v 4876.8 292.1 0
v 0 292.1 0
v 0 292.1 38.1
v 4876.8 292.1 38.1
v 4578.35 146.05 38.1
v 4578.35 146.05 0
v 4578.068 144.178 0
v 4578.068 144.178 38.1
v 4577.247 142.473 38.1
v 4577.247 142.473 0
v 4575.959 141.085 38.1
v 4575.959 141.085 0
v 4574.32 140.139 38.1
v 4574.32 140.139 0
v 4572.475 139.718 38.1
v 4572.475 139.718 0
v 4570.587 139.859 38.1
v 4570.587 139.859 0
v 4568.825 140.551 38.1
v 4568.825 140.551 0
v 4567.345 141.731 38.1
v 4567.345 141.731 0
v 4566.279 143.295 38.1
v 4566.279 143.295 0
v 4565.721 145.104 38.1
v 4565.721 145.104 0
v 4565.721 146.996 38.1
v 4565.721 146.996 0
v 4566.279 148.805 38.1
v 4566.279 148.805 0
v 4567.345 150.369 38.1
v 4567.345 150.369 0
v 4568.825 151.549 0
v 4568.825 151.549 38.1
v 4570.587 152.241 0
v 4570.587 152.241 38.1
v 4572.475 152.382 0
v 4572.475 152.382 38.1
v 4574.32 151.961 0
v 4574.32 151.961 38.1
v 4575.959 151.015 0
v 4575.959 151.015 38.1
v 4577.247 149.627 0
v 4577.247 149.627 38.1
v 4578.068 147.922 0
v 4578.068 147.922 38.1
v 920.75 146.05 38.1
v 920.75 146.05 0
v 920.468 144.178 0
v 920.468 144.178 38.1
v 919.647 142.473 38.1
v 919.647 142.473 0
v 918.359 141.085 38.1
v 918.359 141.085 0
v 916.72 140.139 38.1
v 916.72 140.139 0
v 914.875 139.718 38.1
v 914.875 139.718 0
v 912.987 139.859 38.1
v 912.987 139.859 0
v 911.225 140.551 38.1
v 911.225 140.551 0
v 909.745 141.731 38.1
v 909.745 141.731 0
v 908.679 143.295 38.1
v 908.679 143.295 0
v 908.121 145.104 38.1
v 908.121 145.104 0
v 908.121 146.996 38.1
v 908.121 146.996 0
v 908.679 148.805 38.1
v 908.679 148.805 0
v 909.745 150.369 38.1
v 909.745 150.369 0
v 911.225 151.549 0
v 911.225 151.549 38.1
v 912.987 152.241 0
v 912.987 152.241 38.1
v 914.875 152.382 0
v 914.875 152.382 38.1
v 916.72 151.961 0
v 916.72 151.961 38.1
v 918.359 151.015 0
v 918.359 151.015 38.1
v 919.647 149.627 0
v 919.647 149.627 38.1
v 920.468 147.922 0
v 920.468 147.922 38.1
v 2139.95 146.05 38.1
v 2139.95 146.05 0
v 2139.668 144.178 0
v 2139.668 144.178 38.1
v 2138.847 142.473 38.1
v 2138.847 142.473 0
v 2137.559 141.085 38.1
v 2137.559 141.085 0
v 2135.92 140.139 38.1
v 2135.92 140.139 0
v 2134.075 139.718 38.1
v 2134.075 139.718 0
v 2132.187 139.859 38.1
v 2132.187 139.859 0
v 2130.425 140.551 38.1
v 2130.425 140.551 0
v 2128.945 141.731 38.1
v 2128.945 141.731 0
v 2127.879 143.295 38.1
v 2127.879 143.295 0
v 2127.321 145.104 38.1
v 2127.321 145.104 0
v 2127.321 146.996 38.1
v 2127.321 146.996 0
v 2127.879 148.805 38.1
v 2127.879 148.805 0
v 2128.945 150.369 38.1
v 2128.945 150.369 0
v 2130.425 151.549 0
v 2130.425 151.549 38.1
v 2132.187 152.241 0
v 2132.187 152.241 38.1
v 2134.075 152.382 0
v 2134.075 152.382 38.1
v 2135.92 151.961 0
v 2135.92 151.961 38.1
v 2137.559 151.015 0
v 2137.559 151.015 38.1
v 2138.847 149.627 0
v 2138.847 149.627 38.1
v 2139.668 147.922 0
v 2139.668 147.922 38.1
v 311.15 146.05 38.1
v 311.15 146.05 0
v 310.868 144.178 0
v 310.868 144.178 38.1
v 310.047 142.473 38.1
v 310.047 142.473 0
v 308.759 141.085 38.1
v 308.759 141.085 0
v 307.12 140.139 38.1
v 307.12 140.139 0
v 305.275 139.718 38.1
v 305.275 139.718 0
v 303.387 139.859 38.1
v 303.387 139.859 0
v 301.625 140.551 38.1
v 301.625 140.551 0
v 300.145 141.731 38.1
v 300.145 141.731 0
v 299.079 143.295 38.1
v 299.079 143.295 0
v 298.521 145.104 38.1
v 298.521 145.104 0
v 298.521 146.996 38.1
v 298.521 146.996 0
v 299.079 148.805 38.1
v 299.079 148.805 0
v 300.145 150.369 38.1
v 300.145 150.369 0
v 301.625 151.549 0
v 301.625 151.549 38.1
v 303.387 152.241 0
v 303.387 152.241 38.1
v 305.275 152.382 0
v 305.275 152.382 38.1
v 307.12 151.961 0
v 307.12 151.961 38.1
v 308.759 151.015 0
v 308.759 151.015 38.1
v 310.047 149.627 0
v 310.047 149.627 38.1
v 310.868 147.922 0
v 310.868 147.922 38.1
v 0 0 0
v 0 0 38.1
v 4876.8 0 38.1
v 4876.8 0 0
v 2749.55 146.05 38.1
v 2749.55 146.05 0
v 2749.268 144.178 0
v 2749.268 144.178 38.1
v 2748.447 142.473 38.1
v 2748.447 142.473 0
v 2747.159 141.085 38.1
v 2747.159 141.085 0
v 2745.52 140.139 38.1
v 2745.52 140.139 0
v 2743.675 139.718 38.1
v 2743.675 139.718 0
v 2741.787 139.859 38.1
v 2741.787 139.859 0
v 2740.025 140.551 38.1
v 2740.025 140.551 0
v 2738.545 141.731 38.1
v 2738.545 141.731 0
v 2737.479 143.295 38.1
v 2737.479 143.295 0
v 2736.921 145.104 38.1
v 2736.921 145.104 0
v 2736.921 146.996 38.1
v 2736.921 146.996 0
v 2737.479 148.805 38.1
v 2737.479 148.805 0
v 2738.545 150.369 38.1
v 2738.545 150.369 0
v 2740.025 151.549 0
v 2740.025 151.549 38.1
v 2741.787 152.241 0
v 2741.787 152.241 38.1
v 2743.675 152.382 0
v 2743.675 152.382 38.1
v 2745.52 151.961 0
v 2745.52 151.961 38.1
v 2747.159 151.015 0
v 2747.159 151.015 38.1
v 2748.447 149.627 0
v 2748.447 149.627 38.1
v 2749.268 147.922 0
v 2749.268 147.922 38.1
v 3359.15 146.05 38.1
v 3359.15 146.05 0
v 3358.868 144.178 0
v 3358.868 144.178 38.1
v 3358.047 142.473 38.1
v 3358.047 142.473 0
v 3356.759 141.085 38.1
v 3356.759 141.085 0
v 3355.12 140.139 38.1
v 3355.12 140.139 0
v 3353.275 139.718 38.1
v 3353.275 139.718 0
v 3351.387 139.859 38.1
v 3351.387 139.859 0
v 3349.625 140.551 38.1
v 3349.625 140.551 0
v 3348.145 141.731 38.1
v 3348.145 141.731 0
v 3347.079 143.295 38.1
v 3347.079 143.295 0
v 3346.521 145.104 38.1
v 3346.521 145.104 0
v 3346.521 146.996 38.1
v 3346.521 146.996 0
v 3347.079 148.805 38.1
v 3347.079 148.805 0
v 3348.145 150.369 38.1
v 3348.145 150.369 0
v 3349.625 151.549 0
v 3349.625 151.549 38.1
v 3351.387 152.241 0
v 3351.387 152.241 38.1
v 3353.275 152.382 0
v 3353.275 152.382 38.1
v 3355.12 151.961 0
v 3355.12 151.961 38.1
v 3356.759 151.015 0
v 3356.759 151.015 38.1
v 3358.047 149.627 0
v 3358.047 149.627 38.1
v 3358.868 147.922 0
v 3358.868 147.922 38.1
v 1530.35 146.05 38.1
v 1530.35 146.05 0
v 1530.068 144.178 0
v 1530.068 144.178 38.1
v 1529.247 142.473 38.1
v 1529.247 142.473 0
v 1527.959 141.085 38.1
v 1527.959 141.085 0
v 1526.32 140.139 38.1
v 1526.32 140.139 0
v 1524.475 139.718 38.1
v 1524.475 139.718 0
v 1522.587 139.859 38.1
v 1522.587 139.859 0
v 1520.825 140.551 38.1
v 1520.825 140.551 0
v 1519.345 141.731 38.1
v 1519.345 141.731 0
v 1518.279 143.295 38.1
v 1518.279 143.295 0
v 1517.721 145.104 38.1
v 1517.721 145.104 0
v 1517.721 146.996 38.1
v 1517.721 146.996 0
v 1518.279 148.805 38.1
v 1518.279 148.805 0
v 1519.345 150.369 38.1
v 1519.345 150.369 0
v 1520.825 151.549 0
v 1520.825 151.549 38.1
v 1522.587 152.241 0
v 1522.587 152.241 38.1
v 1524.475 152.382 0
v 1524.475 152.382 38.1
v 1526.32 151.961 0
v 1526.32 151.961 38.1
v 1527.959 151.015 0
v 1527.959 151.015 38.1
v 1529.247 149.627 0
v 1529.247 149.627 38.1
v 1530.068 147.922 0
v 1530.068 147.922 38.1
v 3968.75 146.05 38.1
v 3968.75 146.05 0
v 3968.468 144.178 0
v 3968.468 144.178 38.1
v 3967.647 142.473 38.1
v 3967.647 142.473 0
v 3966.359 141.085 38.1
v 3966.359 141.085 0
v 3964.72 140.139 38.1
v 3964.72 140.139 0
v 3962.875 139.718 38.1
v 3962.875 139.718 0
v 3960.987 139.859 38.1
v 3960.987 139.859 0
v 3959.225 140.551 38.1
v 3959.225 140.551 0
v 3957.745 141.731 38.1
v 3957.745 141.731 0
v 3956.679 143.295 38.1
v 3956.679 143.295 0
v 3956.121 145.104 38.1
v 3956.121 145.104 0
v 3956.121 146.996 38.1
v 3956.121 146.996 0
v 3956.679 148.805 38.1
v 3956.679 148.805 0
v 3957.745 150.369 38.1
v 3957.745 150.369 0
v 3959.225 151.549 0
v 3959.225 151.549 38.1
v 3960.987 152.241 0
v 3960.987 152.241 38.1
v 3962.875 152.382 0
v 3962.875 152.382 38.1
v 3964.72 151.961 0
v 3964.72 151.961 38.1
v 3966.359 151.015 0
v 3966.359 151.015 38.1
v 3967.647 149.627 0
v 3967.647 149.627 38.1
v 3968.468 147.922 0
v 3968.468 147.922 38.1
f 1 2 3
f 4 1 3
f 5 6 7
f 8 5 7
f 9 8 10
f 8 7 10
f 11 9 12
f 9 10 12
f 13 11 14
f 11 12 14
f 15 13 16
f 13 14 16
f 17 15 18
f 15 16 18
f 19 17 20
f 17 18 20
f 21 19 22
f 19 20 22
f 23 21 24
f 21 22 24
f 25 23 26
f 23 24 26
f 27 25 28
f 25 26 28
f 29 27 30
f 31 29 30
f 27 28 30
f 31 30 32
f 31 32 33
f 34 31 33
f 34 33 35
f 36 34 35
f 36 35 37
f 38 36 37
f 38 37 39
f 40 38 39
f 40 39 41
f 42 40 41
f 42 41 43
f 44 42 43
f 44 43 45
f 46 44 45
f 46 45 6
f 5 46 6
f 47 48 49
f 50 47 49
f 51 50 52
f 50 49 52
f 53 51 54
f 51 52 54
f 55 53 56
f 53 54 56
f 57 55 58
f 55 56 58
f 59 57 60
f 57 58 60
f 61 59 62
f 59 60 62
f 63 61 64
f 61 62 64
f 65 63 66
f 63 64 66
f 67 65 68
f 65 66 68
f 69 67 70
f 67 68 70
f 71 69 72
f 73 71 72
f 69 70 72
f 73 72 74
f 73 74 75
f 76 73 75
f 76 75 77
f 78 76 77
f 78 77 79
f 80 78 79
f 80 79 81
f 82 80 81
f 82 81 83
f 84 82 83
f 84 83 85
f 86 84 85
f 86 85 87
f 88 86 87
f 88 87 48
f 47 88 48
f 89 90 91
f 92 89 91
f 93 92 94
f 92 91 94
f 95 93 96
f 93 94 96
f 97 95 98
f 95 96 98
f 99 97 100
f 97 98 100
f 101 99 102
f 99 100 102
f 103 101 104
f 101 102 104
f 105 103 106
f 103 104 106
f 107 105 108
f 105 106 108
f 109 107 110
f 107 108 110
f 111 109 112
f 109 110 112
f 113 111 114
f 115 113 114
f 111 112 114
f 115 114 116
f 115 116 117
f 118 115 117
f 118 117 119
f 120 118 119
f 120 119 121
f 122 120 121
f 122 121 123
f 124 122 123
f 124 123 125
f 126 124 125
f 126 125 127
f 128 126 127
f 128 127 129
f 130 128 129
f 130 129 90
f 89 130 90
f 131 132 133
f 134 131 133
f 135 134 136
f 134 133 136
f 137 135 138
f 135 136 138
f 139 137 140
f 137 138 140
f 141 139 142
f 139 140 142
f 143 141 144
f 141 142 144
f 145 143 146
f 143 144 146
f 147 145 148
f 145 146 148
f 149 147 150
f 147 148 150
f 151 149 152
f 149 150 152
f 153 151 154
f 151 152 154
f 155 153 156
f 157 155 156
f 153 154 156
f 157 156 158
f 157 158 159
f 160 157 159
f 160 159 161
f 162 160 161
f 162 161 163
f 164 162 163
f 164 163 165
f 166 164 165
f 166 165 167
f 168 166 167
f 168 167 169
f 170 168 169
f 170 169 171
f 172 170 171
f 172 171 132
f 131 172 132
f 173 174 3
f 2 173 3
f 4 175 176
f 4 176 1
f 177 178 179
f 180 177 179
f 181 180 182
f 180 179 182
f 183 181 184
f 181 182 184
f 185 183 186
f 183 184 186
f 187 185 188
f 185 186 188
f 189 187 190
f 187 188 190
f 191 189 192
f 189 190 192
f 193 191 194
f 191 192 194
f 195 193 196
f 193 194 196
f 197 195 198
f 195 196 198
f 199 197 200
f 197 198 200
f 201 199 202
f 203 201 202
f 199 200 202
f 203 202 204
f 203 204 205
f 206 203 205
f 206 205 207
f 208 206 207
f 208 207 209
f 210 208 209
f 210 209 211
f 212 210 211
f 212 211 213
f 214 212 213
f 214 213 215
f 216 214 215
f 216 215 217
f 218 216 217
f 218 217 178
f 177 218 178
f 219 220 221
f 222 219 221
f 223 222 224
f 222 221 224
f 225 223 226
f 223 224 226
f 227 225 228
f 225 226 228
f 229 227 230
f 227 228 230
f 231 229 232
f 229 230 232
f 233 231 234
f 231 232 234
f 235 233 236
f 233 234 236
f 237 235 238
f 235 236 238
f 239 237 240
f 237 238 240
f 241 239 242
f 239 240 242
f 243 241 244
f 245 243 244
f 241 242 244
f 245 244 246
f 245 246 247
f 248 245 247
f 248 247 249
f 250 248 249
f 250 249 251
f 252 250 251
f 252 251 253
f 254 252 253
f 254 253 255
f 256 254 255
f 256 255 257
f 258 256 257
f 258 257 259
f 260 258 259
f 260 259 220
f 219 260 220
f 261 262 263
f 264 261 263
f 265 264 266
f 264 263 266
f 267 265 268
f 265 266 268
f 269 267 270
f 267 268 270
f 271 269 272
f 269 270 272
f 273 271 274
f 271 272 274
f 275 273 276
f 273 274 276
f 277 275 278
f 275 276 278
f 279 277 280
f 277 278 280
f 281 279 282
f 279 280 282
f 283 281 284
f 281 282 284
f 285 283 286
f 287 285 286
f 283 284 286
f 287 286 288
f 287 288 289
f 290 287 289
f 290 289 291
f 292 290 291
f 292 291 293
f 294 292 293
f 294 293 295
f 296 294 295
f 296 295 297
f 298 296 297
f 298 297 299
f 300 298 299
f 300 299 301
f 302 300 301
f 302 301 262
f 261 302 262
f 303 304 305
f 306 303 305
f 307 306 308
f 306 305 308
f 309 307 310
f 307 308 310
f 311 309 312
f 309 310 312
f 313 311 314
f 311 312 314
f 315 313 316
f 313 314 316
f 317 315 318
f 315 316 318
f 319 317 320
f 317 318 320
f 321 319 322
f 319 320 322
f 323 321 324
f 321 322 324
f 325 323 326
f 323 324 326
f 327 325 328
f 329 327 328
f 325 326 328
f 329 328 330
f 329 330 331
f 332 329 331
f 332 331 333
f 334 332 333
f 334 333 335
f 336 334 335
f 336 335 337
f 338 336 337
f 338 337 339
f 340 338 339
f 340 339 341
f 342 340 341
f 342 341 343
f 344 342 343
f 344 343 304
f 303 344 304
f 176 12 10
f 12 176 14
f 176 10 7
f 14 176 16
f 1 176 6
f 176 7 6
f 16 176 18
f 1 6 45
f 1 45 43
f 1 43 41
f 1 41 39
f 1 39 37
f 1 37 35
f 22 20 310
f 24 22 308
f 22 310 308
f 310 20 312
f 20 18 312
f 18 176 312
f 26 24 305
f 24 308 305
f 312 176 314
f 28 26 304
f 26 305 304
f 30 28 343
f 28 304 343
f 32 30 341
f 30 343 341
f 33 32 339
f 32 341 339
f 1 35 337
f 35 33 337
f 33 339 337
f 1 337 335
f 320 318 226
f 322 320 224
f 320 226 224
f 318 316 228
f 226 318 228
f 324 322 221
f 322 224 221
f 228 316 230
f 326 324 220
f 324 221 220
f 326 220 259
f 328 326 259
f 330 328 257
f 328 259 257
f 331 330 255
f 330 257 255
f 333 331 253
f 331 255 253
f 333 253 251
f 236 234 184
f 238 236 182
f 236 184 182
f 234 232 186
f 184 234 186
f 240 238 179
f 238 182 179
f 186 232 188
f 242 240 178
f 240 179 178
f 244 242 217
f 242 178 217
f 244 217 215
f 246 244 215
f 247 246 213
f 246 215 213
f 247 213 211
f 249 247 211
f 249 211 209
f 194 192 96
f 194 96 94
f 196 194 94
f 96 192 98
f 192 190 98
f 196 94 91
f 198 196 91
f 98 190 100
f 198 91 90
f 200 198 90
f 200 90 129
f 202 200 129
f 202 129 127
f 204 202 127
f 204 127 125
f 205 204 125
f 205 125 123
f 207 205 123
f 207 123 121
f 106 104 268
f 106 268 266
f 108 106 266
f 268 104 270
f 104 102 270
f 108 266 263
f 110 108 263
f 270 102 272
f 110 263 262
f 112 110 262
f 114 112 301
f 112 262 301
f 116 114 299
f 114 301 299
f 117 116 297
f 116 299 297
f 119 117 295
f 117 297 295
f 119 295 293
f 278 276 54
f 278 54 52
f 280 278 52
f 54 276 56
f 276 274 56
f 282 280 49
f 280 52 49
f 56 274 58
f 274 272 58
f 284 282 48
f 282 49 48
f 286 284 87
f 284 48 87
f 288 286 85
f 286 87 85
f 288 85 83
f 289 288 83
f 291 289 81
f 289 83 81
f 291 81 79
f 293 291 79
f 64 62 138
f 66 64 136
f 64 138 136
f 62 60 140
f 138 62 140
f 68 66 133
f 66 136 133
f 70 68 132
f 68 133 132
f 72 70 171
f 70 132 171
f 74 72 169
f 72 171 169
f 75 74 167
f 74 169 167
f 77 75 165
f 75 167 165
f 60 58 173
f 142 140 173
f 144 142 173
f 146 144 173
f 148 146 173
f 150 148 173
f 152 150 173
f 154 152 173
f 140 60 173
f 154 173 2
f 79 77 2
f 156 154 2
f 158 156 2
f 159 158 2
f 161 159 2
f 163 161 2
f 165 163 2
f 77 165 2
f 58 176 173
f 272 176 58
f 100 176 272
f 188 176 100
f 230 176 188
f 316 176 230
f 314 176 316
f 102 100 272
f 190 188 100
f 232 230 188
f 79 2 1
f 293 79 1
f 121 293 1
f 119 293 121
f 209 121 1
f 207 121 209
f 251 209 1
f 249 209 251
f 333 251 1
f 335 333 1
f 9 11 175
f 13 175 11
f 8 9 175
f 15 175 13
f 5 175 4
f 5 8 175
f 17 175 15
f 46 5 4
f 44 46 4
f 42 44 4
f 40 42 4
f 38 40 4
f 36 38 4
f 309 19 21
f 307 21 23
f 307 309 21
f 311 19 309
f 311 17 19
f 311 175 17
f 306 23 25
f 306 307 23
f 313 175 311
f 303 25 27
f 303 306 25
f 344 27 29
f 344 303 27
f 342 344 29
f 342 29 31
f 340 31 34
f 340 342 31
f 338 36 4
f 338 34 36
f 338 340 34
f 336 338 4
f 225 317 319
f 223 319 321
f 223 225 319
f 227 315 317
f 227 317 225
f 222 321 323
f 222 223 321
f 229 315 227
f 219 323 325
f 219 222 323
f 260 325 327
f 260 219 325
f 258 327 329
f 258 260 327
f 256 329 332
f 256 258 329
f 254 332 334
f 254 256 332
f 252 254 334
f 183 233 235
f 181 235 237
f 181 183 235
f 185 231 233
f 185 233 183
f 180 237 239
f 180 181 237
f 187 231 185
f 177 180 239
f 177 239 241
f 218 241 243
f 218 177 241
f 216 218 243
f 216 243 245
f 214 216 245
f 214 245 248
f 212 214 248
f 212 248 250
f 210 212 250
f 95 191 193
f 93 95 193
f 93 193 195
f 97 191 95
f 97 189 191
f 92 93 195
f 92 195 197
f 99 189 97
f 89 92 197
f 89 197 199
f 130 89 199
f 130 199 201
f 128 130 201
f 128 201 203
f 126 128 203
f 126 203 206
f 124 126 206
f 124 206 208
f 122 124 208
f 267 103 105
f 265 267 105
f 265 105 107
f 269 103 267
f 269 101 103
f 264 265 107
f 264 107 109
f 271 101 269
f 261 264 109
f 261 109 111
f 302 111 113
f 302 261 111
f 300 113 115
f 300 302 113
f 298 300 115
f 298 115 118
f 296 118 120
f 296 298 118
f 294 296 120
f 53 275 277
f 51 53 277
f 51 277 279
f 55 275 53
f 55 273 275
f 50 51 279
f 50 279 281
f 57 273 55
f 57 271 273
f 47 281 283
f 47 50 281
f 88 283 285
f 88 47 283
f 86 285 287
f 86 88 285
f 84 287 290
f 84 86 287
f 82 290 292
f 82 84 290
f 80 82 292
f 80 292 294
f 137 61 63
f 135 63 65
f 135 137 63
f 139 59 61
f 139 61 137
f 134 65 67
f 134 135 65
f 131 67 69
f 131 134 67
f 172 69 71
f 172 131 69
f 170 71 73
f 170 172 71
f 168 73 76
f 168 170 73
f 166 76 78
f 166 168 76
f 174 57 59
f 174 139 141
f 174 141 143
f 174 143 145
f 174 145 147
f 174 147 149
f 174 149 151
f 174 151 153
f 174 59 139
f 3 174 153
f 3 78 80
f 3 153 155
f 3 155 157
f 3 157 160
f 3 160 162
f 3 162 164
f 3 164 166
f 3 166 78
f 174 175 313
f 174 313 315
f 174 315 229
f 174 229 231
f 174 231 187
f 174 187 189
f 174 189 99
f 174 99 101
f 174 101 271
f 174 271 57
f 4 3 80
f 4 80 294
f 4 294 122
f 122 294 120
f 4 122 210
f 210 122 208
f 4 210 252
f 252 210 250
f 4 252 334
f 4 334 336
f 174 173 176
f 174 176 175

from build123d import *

# Parameters (mm, degrees)
F0_W     = 292.1
F0_H     = 38.1
F1_DEPTH = 4876.8
F2_R     = 6.35
F3_DEPTH = 38.101


with BuildPart() as f1:
    # F0 (on Right) → F1 (new body)
    with BuildSketch(Plane.YZ):
        with Locations((146.05, 19.05)):
            Rectangle(F0_W, F0_H)
    extrude(amount=F1_DEPTH)

    # F2 (on face) → F3 (cut, through all)
    with BuildSketch(Plane(origin=(0, 0, 0), x_dir=(1, 0, 0), z_dir=(0, 0, -1))):
        with Locations((304.8, -146.05)):
            Circle(F2_R)
        with Locations((914.4, -146.05)):
            Circle(F2_R)
        with Locations((1524, -146.05)):
            Circle(F2_R)
        with Locations((3962.4, -146.05)):
            Circle(F2_R)
        with Locations((2133.6, -146.05)):
            Circle(F2_R)
        with Locations((2743.2, -146.05)):
            Circle(F2_R)
        with Locations((3352.8, -146.05)):
            Circle(F2_R)
        with Locations((4572, -146.05)):
            Circle(F2_R)
    extrude(amount=-F3_DEPTH, mode=Mode.SUBTRACT)


solid = f1.part
